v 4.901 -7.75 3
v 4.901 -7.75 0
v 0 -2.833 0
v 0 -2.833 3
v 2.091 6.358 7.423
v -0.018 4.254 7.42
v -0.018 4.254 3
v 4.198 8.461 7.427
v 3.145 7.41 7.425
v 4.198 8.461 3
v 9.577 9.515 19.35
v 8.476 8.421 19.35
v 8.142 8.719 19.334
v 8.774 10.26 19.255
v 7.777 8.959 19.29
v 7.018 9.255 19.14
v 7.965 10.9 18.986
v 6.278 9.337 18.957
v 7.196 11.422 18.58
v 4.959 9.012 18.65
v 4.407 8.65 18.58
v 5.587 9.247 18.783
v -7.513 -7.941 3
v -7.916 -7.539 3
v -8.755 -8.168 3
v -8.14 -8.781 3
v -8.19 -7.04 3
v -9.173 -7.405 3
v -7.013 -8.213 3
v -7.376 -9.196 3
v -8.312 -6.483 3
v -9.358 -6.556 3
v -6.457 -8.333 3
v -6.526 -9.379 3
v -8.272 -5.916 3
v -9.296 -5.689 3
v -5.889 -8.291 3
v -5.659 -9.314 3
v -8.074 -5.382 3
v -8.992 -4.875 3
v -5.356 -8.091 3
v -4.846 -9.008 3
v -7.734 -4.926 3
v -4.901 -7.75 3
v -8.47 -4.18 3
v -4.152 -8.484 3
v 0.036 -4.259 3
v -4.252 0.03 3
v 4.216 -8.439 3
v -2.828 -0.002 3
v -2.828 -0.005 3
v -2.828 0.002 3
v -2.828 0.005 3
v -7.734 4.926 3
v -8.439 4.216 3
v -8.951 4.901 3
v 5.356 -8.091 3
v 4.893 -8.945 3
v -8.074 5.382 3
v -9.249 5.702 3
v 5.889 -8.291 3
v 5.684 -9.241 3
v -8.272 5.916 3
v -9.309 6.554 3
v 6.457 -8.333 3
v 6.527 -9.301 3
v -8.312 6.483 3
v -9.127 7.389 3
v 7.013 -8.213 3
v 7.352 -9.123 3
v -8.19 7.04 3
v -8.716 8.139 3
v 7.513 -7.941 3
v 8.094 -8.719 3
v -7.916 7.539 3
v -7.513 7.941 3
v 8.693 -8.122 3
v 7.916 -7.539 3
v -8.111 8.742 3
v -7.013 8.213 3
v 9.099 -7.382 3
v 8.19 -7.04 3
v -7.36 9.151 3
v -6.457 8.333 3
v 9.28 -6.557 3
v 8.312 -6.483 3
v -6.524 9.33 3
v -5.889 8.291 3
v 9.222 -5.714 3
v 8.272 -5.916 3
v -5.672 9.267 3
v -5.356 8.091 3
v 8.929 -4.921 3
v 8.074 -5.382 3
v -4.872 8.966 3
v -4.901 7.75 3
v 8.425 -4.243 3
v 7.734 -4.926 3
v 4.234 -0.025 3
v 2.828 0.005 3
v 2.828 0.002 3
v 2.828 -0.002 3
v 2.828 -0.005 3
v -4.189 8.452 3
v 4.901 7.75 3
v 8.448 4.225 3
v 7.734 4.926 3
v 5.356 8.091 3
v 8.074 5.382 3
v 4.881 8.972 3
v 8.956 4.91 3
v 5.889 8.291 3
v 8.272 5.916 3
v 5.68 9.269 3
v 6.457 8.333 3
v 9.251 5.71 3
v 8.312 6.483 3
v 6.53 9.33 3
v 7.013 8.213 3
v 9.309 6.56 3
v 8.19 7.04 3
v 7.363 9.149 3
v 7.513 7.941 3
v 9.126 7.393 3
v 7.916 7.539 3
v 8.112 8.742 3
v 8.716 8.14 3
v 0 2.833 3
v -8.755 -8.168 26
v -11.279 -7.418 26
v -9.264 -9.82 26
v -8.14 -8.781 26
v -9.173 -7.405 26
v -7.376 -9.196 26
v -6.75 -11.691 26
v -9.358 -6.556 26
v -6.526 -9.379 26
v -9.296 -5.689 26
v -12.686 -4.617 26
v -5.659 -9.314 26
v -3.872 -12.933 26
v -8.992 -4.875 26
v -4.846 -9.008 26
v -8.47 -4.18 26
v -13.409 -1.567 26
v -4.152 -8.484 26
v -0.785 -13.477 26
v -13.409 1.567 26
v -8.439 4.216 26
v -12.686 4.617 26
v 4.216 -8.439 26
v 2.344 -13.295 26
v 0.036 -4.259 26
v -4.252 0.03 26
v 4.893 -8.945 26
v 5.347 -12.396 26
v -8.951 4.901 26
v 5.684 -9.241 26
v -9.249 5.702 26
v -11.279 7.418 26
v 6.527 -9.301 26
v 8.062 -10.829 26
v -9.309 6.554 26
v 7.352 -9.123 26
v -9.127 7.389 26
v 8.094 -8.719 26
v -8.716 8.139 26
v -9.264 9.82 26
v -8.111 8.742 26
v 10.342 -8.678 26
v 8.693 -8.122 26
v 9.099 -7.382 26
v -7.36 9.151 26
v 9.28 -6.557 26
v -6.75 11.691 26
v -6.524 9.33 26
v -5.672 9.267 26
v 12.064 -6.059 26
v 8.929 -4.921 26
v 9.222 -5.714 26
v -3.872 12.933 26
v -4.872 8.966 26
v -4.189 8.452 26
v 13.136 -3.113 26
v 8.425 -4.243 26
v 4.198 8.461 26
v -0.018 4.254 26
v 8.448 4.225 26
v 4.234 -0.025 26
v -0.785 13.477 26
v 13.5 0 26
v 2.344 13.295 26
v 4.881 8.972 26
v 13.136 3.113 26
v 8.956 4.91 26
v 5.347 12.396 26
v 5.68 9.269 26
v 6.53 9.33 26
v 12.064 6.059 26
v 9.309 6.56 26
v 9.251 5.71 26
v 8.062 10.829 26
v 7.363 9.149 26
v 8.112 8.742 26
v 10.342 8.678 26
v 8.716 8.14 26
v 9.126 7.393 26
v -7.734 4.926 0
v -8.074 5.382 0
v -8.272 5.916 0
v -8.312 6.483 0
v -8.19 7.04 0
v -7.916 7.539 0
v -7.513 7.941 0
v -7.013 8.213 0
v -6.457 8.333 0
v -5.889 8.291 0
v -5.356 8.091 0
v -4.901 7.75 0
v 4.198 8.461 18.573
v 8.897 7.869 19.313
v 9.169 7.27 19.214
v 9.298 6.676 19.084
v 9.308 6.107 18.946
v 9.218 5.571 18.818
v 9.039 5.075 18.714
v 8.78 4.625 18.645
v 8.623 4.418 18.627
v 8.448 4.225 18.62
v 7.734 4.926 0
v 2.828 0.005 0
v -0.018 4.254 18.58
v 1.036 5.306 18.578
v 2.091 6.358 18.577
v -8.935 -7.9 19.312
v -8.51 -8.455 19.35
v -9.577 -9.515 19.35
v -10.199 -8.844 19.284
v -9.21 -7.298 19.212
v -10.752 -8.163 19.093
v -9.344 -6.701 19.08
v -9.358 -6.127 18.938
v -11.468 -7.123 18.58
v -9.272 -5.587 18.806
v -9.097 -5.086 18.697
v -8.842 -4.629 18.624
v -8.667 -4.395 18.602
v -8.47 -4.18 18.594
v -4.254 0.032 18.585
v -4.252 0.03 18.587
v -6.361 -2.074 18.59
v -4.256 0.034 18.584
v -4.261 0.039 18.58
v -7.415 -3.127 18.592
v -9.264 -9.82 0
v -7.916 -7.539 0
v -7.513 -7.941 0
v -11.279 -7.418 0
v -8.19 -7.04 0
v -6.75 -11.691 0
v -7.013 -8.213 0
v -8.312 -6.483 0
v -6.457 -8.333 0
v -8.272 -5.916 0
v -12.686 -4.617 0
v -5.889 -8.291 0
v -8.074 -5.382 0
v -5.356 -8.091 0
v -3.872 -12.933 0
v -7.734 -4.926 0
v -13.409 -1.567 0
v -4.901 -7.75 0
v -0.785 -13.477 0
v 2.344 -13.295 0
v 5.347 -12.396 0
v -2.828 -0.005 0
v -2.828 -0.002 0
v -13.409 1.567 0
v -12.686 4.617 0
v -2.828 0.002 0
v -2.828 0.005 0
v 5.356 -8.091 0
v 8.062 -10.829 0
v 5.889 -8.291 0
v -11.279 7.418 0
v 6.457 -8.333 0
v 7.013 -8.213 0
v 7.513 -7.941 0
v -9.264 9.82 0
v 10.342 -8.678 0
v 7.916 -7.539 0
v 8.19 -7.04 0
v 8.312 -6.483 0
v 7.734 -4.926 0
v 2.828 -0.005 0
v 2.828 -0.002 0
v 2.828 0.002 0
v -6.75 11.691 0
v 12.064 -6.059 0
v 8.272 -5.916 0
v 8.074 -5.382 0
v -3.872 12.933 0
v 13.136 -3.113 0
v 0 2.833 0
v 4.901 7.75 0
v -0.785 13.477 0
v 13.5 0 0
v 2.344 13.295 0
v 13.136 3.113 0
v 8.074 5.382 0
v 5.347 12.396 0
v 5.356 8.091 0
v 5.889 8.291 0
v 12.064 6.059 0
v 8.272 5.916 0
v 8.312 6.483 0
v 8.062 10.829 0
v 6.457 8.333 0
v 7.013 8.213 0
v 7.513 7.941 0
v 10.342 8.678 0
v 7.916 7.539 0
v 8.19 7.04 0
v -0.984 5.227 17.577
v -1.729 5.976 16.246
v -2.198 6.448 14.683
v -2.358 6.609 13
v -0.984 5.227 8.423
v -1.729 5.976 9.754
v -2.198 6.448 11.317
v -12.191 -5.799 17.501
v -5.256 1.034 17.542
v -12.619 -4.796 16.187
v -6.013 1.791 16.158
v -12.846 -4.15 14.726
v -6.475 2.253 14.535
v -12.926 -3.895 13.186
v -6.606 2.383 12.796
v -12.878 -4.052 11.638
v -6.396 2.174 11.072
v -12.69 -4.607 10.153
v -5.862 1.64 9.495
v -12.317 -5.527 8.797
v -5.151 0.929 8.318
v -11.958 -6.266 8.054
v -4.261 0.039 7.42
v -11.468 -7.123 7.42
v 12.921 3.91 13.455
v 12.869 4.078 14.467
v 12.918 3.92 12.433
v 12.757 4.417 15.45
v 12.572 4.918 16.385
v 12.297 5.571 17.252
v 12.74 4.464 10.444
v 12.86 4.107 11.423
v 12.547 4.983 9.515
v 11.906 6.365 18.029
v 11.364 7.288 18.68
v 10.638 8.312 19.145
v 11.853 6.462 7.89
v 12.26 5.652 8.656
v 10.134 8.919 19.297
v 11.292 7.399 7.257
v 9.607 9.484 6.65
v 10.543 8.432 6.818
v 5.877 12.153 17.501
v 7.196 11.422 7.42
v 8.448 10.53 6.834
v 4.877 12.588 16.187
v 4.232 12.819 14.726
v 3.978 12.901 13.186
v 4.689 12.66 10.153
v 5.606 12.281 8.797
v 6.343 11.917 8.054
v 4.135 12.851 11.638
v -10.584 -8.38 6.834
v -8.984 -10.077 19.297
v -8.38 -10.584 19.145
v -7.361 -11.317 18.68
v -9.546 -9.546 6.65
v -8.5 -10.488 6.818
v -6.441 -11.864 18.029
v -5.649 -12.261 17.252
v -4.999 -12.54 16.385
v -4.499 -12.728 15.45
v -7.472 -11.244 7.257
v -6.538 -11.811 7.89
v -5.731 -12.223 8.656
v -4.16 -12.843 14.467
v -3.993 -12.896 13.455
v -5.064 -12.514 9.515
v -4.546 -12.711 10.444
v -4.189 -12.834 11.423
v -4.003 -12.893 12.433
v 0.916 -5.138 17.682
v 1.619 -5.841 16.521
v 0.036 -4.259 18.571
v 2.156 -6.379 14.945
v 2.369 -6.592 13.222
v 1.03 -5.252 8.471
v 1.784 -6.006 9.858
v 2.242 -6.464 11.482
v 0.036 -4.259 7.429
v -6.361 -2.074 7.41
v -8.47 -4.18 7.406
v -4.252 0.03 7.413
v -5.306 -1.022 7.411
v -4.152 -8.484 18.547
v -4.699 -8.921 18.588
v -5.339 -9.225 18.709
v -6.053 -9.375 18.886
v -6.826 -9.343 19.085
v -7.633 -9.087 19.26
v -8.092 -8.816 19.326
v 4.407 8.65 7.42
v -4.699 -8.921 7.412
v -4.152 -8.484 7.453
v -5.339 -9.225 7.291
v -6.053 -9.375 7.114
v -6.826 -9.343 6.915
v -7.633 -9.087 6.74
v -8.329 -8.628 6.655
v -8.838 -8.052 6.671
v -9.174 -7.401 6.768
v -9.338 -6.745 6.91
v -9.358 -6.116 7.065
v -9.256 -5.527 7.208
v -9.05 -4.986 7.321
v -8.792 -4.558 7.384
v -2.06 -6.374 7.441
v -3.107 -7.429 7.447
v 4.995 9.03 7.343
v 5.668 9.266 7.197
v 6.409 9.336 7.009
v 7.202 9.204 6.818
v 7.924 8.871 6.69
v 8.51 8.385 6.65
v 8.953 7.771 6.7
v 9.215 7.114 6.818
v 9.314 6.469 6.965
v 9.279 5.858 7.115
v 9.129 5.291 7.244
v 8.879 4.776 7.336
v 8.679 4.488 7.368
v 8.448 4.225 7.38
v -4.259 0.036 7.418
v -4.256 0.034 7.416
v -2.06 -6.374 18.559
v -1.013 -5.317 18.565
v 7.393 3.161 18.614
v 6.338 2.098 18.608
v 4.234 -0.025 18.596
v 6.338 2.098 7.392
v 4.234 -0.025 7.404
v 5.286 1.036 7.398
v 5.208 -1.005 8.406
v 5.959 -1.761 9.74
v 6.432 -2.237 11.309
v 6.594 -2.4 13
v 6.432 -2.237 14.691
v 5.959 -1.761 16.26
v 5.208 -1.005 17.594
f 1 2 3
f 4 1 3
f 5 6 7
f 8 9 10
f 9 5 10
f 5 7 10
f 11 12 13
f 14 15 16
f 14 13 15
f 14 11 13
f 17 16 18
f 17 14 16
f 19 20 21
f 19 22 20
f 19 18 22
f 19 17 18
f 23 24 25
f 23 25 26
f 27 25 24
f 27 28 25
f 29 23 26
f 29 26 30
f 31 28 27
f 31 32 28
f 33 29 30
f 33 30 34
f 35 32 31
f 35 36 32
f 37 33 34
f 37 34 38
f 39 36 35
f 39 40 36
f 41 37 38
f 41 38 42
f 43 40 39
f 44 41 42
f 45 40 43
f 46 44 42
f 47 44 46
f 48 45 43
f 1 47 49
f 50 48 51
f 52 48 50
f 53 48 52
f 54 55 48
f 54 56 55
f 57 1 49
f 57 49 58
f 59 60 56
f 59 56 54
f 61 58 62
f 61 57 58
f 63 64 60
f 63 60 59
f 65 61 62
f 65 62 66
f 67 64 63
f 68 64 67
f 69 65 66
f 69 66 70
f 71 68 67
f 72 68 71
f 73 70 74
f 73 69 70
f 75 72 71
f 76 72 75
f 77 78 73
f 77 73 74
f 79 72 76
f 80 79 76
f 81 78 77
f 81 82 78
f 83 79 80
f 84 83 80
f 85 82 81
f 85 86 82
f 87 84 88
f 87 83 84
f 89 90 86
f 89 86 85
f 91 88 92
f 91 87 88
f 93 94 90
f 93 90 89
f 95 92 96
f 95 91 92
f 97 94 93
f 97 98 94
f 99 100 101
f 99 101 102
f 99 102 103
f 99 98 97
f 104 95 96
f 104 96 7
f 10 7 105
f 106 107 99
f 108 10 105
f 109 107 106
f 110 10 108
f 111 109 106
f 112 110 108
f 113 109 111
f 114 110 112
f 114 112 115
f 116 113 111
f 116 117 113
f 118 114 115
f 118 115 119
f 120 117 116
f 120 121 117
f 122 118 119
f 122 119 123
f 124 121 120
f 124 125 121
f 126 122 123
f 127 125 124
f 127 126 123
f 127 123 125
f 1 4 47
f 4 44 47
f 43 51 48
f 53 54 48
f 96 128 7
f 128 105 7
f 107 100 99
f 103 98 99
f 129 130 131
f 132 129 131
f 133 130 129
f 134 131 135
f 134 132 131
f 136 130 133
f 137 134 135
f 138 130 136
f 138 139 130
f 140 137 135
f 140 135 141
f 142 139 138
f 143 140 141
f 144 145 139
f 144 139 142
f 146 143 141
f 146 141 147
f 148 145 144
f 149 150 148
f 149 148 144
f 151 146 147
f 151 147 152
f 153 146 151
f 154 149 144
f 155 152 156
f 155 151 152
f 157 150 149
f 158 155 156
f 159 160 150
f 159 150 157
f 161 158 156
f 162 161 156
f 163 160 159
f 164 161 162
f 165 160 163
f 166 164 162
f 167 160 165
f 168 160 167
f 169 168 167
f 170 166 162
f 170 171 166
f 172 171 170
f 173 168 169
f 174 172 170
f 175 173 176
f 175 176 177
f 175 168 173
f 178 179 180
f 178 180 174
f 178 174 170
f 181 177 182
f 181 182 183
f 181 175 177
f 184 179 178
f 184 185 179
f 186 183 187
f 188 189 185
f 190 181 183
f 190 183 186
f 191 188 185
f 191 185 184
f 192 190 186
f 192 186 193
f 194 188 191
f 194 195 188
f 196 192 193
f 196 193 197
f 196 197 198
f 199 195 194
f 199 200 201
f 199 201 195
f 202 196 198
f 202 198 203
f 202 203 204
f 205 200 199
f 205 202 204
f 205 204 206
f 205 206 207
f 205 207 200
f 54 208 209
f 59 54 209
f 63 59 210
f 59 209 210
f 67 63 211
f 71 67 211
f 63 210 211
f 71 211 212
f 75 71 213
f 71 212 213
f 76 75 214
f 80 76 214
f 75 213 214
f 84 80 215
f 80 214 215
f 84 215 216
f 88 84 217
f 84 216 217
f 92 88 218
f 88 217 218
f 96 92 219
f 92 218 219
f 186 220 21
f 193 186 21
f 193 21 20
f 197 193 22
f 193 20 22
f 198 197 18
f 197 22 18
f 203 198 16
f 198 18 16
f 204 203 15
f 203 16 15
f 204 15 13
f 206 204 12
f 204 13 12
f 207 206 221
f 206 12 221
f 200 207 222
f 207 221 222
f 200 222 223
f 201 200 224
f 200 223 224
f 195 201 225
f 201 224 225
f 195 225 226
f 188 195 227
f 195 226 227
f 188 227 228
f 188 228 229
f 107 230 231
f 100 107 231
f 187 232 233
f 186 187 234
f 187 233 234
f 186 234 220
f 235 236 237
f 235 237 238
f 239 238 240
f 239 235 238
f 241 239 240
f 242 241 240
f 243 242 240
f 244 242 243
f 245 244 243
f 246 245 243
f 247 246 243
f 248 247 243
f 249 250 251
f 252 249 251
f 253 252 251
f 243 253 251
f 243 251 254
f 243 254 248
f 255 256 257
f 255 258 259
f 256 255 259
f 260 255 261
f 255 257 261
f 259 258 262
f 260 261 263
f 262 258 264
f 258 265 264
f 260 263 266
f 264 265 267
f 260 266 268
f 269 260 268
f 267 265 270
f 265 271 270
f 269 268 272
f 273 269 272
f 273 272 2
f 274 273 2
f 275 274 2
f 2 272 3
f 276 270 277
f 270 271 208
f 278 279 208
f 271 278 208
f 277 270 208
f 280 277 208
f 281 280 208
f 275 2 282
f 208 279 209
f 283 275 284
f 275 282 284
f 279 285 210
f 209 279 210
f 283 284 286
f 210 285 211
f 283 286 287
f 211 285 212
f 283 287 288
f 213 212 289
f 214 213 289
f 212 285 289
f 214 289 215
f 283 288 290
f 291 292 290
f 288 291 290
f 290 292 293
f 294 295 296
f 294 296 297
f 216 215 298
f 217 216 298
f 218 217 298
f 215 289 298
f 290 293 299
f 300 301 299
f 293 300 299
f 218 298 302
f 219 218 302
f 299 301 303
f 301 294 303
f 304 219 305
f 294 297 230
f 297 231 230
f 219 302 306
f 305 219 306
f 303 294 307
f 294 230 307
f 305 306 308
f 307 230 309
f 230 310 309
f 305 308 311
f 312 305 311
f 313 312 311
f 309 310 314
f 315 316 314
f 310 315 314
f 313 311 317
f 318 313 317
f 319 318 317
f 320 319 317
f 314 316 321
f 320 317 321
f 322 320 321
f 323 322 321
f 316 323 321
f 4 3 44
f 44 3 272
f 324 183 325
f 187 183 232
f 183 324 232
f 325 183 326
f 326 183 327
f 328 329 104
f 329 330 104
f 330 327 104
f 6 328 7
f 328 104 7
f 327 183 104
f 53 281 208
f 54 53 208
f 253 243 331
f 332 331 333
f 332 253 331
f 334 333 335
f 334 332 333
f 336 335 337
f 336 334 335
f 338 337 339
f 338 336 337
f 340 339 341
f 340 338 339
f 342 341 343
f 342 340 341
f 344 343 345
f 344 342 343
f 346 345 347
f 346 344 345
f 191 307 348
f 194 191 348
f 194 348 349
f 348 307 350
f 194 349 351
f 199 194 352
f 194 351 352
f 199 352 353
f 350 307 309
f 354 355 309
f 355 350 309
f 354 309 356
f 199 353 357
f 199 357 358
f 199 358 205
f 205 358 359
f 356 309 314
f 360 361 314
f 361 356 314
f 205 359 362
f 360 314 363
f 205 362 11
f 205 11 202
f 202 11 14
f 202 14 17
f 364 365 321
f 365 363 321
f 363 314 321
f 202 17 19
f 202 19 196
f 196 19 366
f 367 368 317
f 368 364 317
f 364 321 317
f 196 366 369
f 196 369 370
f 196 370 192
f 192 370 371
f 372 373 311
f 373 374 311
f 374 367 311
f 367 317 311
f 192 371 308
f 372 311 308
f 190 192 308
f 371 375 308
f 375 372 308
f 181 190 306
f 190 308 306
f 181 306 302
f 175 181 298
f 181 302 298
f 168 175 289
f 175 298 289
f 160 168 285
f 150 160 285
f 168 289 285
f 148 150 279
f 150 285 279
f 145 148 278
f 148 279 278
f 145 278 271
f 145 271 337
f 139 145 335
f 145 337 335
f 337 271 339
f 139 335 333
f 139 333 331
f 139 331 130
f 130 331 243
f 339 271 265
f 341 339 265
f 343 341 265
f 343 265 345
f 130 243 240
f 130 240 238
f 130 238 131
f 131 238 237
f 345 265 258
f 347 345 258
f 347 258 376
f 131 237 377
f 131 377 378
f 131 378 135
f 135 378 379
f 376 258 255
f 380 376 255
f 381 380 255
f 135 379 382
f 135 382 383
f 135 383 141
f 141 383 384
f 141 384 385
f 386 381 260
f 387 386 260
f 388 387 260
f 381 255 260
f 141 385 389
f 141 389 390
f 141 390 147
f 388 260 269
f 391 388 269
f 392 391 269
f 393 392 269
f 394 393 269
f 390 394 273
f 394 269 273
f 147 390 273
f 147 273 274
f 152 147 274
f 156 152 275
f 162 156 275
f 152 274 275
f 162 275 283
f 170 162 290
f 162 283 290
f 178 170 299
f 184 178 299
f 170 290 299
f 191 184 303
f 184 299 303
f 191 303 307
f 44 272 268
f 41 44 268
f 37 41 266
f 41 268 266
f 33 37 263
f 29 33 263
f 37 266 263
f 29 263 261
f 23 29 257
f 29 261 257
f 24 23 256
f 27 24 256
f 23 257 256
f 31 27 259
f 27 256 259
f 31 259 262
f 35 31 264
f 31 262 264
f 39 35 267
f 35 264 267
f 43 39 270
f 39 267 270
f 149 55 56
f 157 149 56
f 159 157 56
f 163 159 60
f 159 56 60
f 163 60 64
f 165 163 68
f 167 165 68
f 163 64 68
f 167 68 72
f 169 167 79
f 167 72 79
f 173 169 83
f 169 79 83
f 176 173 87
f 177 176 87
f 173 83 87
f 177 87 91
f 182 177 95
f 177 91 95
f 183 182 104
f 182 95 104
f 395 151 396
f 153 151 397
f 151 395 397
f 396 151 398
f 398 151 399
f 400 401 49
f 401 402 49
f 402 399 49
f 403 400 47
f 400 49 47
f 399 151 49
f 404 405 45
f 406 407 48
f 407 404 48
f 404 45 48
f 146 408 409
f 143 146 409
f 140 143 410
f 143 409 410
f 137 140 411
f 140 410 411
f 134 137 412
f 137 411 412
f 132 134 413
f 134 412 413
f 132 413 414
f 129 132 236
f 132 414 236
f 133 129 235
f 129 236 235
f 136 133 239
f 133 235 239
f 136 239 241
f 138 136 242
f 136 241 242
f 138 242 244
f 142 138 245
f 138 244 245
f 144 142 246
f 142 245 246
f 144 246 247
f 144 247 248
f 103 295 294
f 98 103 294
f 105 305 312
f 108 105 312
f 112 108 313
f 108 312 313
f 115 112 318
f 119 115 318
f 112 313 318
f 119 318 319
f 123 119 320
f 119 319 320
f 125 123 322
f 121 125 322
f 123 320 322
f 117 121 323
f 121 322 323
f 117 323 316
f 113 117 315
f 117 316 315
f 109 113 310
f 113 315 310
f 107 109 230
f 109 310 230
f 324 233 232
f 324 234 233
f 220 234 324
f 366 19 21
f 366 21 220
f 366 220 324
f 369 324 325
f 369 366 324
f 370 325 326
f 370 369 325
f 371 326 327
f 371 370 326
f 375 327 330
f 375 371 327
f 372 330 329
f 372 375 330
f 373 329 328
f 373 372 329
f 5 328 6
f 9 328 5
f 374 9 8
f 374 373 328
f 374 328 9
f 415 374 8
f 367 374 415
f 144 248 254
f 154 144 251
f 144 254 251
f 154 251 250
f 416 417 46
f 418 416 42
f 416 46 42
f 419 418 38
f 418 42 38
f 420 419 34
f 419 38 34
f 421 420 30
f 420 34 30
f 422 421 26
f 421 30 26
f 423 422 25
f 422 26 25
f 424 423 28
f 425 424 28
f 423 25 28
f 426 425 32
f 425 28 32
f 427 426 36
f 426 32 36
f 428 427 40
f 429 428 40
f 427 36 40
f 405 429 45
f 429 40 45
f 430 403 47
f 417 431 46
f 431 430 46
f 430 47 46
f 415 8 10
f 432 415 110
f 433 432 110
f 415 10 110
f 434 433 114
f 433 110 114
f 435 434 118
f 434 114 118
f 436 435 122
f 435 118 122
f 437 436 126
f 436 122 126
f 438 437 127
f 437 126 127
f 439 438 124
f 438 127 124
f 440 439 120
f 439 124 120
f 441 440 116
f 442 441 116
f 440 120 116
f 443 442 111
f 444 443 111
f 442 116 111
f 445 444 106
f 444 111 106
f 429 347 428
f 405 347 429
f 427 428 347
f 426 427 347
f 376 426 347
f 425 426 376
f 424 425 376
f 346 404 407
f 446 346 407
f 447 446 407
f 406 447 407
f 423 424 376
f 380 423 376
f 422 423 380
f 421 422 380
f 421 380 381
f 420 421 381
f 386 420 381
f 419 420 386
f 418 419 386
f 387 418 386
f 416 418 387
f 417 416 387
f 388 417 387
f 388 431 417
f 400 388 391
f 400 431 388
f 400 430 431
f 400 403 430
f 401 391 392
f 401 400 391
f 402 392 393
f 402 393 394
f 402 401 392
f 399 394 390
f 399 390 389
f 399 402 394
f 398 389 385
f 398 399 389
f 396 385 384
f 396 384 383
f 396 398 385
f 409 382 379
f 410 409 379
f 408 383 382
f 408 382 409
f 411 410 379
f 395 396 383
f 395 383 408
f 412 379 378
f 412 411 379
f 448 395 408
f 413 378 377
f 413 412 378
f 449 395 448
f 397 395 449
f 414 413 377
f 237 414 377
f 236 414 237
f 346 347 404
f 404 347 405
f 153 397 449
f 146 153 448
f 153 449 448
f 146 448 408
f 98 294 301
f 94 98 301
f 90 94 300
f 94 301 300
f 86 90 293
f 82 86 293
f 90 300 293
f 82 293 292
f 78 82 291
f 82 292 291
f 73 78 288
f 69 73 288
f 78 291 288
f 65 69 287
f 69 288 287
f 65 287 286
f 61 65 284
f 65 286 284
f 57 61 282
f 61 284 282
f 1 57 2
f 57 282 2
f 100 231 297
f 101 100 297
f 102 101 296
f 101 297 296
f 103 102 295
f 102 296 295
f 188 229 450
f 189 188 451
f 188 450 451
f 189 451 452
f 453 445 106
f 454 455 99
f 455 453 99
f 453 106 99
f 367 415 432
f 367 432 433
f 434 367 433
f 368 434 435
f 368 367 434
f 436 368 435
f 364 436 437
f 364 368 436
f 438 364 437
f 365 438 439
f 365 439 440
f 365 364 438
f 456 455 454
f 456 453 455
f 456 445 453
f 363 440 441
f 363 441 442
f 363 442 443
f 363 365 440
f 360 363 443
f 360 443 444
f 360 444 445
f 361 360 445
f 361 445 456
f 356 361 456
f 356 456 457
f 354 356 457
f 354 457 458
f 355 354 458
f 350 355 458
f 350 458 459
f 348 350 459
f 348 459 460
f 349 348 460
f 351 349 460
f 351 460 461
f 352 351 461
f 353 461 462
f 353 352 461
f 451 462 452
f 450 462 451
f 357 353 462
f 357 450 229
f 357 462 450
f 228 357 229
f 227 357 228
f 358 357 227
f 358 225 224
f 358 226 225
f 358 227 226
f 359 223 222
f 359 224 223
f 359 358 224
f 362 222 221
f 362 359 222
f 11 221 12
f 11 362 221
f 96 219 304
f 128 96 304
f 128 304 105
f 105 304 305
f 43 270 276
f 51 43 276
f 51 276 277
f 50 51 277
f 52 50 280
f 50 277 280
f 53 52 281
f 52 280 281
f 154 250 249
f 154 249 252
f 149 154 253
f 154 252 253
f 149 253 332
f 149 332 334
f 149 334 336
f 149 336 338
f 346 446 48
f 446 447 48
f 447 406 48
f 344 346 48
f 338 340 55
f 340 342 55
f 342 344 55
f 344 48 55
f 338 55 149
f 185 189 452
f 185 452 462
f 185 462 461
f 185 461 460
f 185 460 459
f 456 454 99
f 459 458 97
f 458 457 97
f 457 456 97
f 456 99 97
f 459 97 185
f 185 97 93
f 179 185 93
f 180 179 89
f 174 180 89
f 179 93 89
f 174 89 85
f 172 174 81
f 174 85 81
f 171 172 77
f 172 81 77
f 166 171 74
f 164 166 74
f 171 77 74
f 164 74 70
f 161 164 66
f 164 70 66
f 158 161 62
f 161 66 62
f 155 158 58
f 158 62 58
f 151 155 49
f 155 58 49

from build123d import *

# Parameters (mm, degrees)
SKETCH_1_R               = 13.5
EXTRUDE_1_DEPTH          = 3
SKETCH_2_R               = 13.5
EXTRUDE_3_DEPTH          = 23
CUT_EXTRUDE_1_DEPTH      = 23
CUT_EXTRUDE_1_DEPTH_BACK = 23
SKETCH_4_R               = 6.35


with BuildPart() as part:
    # 草图1 → 凸台-拉伸1 (new body)
    with BuildSketch(Plane.XY):
        Circle(SKETCH_1_R)
        with BuildLine():
            Line((0, -2.832983292), (-4.900787729, -7.749547196))
            ThreePointArc((-4.900787729, -7.749547196), (-7.729211202, -7.754092383), (-7.733756389, -4.92566891))
            Line((-7.733756389, -4.92566891), (-2.828423473, -0.004545187))
            ThreePointArc((-2.828423473, -0.004545187), (-2.828427125, 0), (-2.828423473, 0.004545187))
            Line((-2.828423473, 0.004545187), (-7.733756389, 4.92566891))
            ThreePointArc((-7.733756389, 4.92566891), (-7.729211202, 7.754092383), (-4.900787729, 7.749547196))
            Line((-4.900787729, 7.749547196), (0, 2.832983292))
            Line((0, 2.832983292), (4.900787729, 7.749547196))
            ThreePointArc((4.900787729, 7.749547196), (7.729211202, 7.754092383), (7.733756389, 4.92566891))
            Line((7.733756389, 4.92566891), (2.828423473, 0.004545187))
            ThreePointArc((2.828423473, 0.004545187), (2.828427125, 0), (2.828423473, -0.004545187))
            Line((2.828423473, -0.004545187), (7.733756389, -4.92566891))
            ThreePointArc((7.733756389, -4.92566891), (7.729211202, -7.754092383), (4.900787729, -7.749547196))
            Line((4.900787729, -7.749547196), (0, -2.832983292))
        make_face(mode=Mode.SUBTRACT)
    extrude(amount=EXTRUDE_1_DEPTH)

    # 草图2 → 凸台-拉伸3 (add)
    with BuildSketch(Plane.XY.offset(3)):
        Circle(SKETCH_2_R)
        with BuildLine():
            ThreePointArc((-8.438592403, 4.216287709), (-8.435180773, 8.462334548), (-4.189144899, 8.452099668))
            Line((-4.189144899, 8.452099668), (-0.01808109, 4.25413827))
            Line((-0.01808109, 4.25413827), (4.198281258, 8.461255384))
            ThreePointArc((4.198281258, 8.461255384), (8.435180773, 8.462334548), (8.447718707, 4.225453447))
            Line((8.447718707, 4.225453447), (4.233699653, -0.025060575))
            Line((4.233699653, -0.025060575), (8.424997972, -4.243386968))
            ThreePointArc((8.424997972, -4.243386968), (8.414877485, -8.441965901), (4.216287709, -8.438592403))
            Line((4.216287709, -8.438592403), (0.036402841, -4.258707534))
            Line((0.036402841, -4.258707534), (-4.152452764, -8.483840182))
            ThreePointArc((-4.152452764, -8.483840182), (-8.469351133, -8.496614906), (-8.470450678, -4.179697776))
            Line((-8.470450678, -4.179697776), (-4.251903786, 0.029599093))
            Line((-4.251903786, 0.029599093), (-8.438592403, 4.216287709))
        make_face(mode=Mode.SUBTRACT)
    extrude(amount=EXTRUDE_3_DEPTH)

    # 草图4 → 切除-拉伸1 (cut, two sides: drawn at the far end of the back side and taken through both)
    with BuildSketch(Plane(origin=(2.117926536, 2.10435635, 0), x_dir=(0, 0, 1), z_dir=(-0.7093757200092603, -0.7048305384000778, 0)).offset(-CUT_EXTRUDE_1_DEPTH_BACK)):
        with Locations((13, 0)):
            Circle(SKETCH_4_R)
    extrude(amount=CUT_EXTRUDE_1_DEPTH + CUT_EXTRUDE_1_DEPTH_BACK, mode=Mode.SUBTRACT)


solid = part.part
